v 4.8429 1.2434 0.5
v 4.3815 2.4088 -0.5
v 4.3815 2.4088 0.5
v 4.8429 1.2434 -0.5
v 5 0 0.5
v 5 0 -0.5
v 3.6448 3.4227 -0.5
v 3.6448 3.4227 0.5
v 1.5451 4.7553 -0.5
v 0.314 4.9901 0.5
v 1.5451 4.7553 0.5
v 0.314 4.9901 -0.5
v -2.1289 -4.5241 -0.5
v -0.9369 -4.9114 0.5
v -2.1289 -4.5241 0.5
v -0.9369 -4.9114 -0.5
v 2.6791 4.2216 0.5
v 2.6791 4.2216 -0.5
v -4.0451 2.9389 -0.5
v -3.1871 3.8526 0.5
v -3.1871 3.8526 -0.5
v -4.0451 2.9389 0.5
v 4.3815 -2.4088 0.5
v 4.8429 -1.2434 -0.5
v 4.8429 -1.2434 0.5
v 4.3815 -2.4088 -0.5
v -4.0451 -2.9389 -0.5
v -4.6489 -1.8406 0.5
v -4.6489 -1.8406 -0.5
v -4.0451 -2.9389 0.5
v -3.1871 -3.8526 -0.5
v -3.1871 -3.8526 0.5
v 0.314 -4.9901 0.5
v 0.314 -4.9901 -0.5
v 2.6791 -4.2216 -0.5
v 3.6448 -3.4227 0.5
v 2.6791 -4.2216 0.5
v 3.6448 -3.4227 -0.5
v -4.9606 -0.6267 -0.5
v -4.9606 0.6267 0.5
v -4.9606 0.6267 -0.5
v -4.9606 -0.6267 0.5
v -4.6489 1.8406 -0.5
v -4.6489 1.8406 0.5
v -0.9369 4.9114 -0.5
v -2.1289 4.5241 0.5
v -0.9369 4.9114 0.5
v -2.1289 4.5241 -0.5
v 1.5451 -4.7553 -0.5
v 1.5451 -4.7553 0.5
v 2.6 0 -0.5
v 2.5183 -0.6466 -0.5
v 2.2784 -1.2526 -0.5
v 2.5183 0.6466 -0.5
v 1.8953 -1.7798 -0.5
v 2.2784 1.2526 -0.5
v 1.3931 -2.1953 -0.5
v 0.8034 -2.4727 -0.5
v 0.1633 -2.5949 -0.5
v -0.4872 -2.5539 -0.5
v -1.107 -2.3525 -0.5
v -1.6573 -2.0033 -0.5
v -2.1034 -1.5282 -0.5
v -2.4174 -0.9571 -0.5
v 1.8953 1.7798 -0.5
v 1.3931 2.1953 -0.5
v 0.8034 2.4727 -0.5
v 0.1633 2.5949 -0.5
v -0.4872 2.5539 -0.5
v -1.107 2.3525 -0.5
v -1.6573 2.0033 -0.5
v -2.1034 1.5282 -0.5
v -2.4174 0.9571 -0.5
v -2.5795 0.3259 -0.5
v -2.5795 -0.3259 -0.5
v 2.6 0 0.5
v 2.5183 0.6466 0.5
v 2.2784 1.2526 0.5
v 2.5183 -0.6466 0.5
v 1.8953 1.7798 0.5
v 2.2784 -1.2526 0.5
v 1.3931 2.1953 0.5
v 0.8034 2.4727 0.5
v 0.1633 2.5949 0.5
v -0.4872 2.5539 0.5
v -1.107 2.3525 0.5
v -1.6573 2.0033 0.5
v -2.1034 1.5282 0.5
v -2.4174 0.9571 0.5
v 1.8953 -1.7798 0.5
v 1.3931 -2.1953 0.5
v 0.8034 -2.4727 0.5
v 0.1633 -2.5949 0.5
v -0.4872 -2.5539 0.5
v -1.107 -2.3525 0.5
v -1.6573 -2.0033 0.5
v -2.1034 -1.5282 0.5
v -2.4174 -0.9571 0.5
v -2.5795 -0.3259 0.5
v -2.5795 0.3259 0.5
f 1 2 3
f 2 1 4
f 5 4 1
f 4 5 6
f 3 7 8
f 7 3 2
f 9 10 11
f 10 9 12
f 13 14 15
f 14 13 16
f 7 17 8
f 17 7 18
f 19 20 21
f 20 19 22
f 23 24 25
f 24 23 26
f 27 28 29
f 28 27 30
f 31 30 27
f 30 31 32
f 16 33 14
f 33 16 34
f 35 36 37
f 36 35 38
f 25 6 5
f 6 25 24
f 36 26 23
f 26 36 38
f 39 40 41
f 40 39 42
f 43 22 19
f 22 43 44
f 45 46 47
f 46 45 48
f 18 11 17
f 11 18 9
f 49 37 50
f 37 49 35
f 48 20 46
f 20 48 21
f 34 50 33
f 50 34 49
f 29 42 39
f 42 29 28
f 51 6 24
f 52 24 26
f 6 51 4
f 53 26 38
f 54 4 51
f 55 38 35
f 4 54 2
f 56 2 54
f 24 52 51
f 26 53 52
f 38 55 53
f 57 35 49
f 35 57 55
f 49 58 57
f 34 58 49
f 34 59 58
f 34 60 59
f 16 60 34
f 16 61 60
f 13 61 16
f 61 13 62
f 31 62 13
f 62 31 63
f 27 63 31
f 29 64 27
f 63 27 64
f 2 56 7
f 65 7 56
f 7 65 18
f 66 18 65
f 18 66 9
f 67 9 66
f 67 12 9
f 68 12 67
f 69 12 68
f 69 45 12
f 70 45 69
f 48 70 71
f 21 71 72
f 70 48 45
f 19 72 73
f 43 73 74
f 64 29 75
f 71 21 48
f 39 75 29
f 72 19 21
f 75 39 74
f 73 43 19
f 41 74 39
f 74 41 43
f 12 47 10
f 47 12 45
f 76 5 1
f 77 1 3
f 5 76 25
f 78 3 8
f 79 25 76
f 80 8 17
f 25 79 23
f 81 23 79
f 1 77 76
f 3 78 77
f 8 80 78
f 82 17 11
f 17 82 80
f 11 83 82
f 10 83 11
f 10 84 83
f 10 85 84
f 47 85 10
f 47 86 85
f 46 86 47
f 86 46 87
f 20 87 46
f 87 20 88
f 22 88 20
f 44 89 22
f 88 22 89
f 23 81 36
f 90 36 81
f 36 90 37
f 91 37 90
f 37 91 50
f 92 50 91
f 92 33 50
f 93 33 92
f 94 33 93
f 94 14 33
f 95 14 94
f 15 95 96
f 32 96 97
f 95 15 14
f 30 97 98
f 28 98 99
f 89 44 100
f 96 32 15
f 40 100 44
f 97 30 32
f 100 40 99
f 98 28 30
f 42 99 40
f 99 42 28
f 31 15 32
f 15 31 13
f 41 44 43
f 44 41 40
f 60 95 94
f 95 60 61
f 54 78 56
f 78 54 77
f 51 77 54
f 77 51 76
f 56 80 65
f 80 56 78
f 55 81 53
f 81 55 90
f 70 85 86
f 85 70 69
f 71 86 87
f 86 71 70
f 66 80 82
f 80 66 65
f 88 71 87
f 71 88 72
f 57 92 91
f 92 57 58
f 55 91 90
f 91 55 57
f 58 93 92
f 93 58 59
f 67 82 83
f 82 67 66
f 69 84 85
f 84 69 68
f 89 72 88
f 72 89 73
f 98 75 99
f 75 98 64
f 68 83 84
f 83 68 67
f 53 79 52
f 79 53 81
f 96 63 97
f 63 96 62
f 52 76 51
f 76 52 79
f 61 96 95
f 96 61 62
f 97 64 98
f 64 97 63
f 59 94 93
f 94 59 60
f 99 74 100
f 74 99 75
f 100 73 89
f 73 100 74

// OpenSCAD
difference() {
    cylinder(h=1, d=10, $fn=25, center=true);
    cylinder(h=1, d=5.2, $fn=25, center=true);
}
